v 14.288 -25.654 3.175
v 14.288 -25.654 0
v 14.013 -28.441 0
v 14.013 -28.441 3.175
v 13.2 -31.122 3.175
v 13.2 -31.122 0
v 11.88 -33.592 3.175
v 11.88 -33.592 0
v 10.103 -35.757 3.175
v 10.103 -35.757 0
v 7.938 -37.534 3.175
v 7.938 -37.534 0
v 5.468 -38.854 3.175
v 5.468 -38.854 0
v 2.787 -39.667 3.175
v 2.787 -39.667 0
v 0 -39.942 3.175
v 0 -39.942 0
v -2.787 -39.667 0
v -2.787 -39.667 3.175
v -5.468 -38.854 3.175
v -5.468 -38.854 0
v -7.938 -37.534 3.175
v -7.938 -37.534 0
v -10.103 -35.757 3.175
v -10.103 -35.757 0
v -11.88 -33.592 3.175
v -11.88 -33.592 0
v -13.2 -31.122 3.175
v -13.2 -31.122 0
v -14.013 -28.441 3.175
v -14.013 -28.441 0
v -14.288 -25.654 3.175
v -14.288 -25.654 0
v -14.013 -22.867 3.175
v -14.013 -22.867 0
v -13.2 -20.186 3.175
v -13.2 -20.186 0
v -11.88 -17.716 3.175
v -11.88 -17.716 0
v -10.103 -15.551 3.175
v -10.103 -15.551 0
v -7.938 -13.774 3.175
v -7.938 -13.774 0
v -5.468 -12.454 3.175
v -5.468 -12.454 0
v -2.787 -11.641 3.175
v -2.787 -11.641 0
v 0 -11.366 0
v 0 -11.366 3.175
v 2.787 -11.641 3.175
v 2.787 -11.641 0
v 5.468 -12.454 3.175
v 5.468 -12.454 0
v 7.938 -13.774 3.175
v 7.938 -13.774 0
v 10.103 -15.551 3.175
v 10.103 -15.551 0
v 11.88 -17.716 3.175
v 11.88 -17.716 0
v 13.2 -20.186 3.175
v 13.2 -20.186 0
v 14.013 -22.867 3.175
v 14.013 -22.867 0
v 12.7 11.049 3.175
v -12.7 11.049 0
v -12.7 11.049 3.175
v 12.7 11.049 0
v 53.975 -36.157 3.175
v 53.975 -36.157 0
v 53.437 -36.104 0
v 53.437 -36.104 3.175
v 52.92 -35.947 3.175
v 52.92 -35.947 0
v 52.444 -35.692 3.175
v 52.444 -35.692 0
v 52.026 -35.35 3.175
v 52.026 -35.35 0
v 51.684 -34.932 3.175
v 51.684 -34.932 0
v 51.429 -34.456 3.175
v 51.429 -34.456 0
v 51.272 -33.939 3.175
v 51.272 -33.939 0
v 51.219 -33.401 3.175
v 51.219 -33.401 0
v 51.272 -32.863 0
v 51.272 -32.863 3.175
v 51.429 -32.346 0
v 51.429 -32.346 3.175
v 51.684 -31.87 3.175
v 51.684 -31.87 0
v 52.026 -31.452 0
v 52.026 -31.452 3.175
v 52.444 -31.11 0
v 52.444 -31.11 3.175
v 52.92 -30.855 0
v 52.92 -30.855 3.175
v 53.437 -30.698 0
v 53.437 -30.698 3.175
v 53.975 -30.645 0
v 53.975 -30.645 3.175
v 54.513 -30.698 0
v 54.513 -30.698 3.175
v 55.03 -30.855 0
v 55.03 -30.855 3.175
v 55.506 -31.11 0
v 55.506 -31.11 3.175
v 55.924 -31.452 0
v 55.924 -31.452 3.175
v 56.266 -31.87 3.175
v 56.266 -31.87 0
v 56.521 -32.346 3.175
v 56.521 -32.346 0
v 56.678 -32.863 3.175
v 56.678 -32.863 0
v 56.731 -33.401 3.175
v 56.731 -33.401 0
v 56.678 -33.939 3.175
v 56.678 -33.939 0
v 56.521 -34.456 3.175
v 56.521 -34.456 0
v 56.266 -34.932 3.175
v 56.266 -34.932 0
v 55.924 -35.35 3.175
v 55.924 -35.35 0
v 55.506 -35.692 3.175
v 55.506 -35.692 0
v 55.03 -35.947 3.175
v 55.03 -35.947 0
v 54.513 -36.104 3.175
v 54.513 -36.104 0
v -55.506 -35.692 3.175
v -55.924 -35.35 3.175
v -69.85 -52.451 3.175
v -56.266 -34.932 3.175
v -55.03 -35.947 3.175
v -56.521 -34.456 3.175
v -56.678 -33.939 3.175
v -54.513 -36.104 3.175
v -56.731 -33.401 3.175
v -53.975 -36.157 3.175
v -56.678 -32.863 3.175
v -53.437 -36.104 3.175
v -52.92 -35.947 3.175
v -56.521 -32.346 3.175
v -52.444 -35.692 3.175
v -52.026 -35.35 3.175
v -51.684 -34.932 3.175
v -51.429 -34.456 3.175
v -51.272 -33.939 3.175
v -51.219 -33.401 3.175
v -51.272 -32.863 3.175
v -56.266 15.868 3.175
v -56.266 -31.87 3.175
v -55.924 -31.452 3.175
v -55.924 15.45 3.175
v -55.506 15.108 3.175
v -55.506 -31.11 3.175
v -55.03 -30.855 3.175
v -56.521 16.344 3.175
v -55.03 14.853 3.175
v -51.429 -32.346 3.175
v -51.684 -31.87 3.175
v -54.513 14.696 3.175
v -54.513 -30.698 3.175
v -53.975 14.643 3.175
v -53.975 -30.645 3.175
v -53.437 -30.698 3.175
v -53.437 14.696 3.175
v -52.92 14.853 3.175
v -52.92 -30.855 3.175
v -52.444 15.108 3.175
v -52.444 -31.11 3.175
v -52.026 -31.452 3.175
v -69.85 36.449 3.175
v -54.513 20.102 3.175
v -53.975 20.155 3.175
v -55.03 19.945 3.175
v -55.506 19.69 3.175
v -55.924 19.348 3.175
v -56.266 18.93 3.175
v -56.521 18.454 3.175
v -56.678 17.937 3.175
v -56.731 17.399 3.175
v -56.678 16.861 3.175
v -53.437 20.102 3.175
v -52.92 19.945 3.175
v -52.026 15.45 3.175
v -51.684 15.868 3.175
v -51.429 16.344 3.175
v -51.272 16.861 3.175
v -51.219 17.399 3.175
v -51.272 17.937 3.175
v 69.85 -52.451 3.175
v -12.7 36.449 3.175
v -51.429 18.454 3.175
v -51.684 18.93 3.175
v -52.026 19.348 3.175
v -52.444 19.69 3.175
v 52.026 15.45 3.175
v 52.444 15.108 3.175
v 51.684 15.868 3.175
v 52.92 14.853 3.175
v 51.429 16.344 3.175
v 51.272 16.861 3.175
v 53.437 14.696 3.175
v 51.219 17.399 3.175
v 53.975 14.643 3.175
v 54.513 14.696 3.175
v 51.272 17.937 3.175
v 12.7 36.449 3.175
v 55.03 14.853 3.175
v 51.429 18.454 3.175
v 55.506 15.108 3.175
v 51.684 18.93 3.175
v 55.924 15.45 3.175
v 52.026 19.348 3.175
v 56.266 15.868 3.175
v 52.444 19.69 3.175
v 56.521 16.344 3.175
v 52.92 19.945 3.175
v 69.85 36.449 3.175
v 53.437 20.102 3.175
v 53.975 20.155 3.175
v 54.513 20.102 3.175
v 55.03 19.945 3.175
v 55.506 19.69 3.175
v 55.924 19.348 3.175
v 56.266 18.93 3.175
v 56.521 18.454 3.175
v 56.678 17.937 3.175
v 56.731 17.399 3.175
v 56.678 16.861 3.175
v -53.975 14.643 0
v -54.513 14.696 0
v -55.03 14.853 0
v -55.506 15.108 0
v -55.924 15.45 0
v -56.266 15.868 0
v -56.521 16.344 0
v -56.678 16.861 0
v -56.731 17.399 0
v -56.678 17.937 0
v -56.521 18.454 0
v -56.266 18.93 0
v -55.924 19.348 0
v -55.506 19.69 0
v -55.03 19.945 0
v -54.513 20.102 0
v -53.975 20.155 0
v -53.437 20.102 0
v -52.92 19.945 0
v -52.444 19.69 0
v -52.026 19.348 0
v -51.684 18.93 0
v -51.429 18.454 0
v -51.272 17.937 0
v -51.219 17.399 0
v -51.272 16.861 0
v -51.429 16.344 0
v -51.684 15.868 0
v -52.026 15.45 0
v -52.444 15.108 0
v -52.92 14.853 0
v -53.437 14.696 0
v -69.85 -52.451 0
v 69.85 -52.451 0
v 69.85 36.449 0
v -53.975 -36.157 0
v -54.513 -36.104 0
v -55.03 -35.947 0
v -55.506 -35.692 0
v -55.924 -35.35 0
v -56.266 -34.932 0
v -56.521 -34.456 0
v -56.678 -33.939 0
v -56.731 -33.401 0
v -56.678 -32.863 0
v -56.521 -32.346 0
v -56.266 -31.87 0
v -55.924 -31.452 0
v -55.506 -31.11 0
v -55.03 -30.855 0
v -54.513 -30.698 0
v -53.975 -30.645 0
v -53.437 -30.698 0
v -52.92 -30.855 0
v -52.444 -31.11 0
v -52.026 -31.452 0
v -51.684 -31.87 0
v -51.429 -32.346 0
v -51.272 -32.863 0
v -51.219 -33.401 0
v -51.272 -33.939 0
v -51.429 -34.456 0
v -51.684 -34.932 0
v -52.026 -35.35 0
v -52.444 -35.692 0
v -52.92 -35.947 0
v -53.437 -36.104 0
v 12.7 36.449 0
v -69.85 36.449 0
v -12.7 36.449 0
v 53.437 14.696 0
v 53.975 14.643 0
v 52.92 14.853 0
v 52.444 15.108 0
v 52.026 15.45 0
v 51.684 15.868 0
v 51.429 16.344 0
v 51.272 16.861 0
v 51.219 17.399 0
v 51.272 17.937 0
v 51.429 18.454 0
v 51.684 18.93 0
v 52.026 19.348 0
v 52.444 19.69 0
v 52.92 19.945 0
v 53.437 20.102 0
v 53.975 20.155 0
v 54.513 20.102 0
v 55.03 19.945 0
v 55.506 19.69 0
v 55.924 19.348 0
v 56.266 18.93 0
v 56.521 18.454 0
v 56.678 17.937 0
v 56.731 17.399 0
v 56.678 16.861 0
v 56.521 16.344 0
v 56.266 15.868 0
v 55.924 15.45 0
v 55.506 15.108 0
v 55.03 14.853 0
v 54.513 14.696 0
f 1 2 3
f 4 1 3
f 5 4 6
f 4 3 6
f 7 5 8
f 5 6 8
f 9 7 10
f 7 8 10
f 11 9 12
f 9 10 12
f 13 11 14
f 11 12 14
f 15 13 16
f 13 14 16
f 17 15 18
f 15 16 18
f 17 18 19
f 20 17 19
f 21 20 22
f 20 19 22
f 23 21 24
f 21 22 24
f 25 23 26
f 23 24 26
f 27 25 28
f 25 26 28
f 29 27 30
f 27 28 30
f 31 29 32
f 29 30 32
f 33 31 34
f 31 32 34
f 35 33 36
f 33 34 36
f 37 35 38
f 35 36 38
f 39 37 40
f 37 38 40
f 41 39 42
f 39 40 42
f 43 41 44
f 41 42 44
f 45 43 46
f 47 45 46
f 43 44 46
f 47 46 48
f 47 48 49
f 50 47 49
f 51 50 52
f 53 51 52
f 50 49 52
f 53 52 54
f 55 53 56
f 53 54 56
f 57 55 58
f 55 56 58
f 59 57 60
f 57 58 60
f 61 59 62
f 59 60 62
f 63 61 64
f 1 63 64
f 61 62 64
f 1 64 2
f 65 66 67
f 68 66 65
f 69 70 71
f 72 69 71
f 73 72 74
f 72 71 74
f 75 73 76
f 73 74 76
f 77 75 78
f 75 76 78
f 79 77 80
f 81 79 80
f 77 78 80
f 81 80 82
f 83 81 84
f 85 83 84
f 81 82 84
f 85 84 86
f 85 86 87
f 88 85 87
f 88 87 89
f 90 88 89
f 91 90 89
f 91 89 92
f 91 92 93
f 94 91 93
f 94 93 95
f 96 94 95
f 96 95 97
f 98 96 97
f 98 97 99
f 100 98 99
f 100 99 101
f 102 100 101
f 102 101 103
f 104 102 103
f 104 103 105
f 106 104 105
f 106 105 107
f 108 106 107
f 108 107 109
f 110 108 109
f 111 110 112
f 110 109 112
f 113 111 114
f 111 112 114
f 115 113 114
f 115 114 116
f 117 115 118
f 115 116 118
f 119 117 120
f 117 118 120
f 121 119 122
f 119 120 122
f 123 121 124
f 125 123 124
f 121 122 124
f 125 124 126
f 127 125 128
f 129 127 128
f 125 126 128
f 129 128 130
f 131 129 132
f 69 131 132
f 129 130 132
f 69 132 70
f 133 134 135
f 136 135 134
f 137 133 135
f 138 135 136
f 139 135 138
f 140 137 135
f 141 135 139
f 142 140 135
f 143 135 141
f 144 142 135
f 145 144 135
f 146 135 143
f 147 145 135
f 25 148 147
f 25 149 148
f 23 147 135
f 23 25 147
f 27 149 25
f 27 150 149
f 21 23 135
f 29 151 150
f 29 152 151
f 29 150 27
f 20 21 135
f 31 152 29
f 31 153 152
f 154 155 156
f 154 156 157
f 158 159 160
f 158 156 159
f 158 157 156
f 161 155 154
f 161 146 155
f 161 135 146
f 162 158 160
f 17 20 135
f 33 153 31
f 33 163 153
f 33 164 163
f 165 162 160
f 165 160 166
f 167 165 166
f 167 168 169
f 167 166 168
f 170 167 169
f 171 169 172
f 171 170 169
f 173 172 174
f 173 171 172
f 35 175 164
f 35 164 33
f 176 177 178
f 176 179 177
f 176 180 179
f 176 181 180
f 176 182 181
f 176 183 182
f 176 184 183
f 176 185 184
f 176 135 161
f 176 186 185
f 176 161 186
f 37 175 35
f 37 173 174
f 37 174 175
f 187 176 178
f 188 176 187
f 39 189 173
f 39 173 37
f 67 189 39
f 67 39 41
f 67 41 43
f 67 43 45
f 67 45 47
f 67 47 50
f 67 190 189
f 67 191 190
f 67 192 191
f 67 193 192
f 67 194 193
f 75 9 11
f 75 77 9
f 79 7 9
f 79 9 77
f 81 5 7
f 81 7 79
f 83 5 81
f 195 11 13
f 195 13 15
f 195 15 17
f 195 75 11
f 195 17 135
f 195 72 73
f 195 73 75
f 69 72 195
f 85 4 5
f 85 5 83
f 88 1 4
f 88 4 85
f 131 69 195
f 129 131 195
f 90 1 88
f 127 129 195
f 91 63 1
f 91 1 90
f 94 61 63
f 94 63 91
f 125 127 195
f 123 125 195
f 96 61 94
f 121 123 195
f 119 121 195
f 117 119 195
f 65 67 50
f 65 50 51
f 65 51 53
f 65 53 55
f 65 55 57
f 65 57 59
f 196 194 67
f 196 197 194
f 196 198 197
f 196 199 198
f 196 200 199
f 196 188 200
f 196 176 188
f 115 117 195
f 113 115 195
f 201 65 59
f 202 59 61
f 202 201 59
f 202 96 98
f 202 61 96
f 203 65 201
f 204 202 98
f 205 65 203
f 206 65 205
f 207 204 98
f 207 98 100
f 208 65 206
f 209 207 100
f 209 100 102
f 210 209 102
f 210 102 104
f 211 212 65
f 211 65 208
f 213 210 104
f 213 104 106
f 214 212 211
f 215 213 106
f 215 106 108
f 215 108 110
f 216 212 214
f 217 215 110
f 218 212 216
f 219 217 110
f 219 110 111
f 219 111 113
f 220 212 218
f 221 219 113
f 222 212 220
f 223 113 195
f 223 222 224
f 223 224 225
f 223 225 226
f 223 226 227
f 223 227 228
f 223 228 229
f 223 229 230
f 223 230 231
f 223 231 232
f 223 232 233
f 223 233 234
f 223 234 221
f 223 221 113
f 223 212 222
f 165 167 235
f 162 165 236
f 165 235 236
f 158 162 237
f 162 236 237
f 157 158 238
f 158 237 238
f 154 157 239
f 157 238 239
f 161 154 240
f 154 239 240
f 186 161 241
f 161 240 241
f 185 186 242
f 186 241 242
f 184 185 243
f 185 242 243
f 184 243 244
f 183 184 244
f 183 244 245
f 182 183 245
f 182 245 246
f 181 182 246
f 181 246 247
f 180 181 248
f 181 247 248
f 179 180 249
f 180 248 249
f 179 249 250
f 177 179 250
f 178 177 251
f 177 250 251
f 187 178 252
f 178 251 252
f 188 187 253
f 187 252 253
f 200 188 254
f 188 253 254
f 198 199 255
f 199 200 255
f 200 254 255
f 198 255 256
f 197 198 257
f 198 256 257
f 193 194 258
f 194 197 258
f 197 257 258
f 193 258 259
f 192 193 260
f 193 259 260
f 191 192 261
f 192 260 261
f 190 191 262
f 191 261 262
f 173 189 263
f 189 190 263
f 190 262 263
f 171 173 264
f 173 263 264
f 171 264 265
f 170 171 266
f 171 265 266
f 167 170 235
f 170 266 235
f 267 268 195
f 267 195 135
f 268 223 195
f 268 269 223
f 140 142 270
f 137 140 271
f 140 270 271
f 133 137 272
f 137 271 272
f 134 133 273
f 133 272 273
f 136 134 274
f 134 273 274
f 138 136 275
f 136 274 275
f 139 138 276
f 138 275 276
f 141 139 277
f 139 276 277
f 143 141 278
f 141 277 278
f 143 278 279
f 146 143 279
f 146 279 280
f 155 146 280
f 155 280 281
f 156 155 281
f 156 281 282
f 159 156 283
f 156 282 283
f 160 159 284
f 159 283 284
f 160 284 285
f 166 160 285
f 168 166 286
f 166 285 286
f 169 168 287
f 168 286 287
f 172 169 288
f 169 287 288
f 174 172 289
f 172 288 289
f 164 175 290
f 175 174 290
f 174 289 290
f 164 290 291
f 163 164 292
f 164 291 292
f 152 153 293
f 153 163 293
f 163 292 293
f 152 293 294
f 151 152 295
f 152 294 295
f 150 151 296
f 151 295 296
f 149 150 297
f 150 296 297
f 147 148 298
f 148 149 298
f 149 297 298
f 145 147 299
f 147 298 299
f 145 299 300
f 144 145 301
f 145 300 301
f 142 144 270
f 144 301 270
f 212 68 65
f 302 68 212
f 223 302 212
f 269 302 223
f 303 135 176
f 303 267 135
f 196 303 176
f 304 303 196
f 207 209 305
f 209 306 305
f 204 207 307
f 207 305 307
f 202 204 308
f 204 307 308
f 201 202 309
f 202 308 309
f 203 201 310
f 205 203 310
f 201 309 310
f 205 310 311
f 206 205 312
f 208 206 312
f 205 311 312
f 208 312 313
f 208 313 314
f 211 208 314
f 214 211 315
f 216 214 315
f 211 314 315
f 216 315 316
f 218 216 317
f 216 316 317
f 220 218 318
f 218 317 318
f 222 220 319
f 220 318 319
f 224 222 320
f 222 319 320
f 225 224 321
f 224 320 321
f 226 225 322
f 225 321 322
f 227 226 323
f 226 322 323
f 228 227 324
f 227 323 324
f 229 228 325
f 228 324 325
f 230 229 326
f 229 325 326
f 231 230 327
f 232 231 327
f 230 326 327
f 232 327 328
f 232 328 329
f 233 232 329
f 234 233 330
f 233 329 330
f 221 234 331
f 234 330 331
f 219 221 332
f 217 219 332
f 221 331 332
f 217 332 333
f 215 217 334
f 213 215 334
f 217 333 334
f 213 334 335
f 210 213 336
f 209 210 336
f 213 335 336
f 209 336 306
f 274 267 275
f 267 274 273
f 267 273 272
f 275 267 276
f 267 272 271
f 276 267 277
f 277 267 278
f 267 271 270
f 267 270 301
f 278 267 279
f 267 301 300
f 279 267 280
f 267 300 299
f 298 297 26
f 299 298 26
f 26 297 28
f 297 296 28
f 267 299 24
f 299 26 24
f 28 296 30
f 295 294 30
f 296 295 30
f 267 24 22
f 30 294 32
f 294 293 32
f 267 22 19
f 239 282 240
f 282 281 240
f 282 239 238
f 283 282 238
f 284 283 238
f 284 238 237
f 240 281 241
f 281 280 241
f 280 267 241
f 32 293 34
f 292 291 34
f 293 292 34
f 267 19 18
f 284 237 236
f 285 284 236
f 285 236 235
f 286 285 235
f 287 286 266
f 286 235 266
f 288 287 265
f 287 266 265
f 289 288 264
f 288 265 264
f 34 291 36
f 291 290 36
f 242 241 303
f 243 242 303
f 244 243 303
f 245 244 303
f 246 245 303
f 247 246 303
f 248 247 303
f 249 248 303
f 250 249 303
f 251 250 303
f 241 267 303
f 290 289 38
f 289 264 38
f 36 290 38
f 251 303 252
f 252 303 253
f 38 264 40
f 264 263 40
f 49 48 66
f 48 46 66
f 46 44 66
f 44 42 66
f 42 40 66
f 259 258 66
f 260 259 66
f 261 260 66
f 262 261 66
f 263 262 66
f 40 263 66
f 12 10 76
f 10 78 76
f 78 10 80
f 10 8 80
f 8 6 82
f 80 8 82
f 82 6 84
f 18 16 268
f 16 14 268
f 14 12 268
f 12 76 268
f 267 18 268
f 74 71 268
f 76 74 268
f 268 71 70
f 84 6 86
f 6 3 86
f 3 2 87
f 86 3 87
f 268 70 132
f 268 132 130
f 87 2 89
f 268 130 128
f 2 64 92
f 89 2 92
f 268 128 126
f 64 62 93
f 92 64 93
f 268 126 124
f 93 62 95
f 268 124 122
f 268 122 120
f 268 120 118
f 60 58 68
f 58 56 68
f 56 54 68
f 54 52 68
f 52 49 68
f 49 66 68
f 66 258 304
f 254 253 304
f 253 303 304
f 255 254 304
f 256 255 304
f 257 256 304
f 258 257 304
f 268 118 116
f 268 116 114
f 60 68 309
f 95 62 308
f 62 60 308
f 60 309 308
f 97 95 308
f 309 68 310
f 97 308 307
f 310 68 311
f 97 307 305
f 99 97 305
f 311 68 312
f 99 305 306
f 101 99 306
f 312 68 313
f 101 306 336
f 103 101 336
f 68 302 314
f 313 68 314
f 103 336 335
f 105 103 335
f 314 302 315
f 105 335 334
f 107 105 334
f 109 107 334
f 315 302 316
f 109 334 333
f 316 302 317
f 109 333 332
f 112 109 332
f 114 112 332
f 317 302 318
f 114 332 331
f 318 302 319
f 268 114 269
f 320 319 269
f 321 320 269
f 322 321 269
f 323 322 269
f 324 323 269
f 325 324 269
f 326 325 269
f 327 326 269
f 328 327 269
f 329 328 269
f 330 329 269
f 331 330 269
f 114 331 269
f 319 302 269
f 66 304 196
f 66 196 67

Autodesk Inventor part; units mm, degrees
ref_plane "YZ Plane" through (0, 0, 0) normal (1, 0, 0) x (0, 1, 0)
ref_plane "XZ Plane" through (0, 0, 0) normal (0, 1, 0) x (-1, 0, 0)
ref_plane "XY Plane" through (0, 0, 0) normal (0, 0, 1) x (1, 0, 0)
sketch "Sketch1" plane through (0, 0, 0) normal (0, 0, 1) x (1, 0, 0)
  line L0 (0, -70.231) -> (0, 54.229) projected
  line L1 (69.85, 36.449) -> (69.85, -52.451)
  line L2 (69.85, -52.451) -> (-69.85, -52.451)
  line L3 (-69.85, -52.451) -> (-69.85, 36.449)
  line L4 (-97.79, 0) -> (97.79, 0) projected
  line L5 (-12.7, 36.449) -> (-12.7, 11.049)
  line L6 (-12.7, 11.049) -> (12.7, 11.049)
  line L7 (12.7, 11.049) -> (12.7, 36.449)
  line L8 (-69.85, 36.449) -> (-12.7, 36.449)
  line L9 (12.7, 36.449) -> (69.85, 36.449)
  line L10 (0, -52.451) -> (0, -25.654)
  circle A0 centre (0, -25.654) radius 14.2875
  point P0 (0, 0)
  dimension "d0" = 139.7
  dimension "d1" = 88.9
  dimension "d2" = 25.4
  dimension "d3" = 25.4
  dimension "d5" = 28.575
  dimension "d21" = 62.103
extrude "Extrusion1" add sketch "Sketch1" along normal blind 3.175 contours L2 L3 L4 L0 A0 | L0 A0 L4 L1 L2 | L4 L0 L6 L7 L9 L1 | L3 L8 L5 L6 L0 L4
sketch "Sketch2" plane through (0, 0, 3.175) normal (0, 0, 1) x (1, 0, 0)
  line L0 (69.85, -52.451) -> (69.85, 36.449) projected
  line L1 (-69.85, -52.451) -> (69.85, -52.451) projected
  line L2 (69.85, 36.449) -> (12.7, 36.449) projected
  point P0 (0, 0)
  point P1 (53.975, 17.399)
  point P2 (53.975, -33.401)
  point P3 (53.975, 38.643)
  dimension "d16" = 15.875
  dimension "d18" = 19.05
  dimension "d20" = 19.05
hole "Hole1" at (53.975, 17.399, 3.175) at (53.975, -33.401, 3.175) direction (0, 0, -1) diameter 5.5118 end through all clearance for "Flat Head Machine Screw" size "M5" standard "Ansi Metric M Profile"
mirror "Mirror1" about plane through (0, 0, 0) normal (1, 0, 0) of "Hole1"
sketch "Sketch3" plane through (0, 0, 3.175) normal (0, 0, 1) x (1, 0, 0)
  point P0 (0, 0)
equation "\"d20\" = d18"
properties part number "DIFF_PLATE_ROD"
